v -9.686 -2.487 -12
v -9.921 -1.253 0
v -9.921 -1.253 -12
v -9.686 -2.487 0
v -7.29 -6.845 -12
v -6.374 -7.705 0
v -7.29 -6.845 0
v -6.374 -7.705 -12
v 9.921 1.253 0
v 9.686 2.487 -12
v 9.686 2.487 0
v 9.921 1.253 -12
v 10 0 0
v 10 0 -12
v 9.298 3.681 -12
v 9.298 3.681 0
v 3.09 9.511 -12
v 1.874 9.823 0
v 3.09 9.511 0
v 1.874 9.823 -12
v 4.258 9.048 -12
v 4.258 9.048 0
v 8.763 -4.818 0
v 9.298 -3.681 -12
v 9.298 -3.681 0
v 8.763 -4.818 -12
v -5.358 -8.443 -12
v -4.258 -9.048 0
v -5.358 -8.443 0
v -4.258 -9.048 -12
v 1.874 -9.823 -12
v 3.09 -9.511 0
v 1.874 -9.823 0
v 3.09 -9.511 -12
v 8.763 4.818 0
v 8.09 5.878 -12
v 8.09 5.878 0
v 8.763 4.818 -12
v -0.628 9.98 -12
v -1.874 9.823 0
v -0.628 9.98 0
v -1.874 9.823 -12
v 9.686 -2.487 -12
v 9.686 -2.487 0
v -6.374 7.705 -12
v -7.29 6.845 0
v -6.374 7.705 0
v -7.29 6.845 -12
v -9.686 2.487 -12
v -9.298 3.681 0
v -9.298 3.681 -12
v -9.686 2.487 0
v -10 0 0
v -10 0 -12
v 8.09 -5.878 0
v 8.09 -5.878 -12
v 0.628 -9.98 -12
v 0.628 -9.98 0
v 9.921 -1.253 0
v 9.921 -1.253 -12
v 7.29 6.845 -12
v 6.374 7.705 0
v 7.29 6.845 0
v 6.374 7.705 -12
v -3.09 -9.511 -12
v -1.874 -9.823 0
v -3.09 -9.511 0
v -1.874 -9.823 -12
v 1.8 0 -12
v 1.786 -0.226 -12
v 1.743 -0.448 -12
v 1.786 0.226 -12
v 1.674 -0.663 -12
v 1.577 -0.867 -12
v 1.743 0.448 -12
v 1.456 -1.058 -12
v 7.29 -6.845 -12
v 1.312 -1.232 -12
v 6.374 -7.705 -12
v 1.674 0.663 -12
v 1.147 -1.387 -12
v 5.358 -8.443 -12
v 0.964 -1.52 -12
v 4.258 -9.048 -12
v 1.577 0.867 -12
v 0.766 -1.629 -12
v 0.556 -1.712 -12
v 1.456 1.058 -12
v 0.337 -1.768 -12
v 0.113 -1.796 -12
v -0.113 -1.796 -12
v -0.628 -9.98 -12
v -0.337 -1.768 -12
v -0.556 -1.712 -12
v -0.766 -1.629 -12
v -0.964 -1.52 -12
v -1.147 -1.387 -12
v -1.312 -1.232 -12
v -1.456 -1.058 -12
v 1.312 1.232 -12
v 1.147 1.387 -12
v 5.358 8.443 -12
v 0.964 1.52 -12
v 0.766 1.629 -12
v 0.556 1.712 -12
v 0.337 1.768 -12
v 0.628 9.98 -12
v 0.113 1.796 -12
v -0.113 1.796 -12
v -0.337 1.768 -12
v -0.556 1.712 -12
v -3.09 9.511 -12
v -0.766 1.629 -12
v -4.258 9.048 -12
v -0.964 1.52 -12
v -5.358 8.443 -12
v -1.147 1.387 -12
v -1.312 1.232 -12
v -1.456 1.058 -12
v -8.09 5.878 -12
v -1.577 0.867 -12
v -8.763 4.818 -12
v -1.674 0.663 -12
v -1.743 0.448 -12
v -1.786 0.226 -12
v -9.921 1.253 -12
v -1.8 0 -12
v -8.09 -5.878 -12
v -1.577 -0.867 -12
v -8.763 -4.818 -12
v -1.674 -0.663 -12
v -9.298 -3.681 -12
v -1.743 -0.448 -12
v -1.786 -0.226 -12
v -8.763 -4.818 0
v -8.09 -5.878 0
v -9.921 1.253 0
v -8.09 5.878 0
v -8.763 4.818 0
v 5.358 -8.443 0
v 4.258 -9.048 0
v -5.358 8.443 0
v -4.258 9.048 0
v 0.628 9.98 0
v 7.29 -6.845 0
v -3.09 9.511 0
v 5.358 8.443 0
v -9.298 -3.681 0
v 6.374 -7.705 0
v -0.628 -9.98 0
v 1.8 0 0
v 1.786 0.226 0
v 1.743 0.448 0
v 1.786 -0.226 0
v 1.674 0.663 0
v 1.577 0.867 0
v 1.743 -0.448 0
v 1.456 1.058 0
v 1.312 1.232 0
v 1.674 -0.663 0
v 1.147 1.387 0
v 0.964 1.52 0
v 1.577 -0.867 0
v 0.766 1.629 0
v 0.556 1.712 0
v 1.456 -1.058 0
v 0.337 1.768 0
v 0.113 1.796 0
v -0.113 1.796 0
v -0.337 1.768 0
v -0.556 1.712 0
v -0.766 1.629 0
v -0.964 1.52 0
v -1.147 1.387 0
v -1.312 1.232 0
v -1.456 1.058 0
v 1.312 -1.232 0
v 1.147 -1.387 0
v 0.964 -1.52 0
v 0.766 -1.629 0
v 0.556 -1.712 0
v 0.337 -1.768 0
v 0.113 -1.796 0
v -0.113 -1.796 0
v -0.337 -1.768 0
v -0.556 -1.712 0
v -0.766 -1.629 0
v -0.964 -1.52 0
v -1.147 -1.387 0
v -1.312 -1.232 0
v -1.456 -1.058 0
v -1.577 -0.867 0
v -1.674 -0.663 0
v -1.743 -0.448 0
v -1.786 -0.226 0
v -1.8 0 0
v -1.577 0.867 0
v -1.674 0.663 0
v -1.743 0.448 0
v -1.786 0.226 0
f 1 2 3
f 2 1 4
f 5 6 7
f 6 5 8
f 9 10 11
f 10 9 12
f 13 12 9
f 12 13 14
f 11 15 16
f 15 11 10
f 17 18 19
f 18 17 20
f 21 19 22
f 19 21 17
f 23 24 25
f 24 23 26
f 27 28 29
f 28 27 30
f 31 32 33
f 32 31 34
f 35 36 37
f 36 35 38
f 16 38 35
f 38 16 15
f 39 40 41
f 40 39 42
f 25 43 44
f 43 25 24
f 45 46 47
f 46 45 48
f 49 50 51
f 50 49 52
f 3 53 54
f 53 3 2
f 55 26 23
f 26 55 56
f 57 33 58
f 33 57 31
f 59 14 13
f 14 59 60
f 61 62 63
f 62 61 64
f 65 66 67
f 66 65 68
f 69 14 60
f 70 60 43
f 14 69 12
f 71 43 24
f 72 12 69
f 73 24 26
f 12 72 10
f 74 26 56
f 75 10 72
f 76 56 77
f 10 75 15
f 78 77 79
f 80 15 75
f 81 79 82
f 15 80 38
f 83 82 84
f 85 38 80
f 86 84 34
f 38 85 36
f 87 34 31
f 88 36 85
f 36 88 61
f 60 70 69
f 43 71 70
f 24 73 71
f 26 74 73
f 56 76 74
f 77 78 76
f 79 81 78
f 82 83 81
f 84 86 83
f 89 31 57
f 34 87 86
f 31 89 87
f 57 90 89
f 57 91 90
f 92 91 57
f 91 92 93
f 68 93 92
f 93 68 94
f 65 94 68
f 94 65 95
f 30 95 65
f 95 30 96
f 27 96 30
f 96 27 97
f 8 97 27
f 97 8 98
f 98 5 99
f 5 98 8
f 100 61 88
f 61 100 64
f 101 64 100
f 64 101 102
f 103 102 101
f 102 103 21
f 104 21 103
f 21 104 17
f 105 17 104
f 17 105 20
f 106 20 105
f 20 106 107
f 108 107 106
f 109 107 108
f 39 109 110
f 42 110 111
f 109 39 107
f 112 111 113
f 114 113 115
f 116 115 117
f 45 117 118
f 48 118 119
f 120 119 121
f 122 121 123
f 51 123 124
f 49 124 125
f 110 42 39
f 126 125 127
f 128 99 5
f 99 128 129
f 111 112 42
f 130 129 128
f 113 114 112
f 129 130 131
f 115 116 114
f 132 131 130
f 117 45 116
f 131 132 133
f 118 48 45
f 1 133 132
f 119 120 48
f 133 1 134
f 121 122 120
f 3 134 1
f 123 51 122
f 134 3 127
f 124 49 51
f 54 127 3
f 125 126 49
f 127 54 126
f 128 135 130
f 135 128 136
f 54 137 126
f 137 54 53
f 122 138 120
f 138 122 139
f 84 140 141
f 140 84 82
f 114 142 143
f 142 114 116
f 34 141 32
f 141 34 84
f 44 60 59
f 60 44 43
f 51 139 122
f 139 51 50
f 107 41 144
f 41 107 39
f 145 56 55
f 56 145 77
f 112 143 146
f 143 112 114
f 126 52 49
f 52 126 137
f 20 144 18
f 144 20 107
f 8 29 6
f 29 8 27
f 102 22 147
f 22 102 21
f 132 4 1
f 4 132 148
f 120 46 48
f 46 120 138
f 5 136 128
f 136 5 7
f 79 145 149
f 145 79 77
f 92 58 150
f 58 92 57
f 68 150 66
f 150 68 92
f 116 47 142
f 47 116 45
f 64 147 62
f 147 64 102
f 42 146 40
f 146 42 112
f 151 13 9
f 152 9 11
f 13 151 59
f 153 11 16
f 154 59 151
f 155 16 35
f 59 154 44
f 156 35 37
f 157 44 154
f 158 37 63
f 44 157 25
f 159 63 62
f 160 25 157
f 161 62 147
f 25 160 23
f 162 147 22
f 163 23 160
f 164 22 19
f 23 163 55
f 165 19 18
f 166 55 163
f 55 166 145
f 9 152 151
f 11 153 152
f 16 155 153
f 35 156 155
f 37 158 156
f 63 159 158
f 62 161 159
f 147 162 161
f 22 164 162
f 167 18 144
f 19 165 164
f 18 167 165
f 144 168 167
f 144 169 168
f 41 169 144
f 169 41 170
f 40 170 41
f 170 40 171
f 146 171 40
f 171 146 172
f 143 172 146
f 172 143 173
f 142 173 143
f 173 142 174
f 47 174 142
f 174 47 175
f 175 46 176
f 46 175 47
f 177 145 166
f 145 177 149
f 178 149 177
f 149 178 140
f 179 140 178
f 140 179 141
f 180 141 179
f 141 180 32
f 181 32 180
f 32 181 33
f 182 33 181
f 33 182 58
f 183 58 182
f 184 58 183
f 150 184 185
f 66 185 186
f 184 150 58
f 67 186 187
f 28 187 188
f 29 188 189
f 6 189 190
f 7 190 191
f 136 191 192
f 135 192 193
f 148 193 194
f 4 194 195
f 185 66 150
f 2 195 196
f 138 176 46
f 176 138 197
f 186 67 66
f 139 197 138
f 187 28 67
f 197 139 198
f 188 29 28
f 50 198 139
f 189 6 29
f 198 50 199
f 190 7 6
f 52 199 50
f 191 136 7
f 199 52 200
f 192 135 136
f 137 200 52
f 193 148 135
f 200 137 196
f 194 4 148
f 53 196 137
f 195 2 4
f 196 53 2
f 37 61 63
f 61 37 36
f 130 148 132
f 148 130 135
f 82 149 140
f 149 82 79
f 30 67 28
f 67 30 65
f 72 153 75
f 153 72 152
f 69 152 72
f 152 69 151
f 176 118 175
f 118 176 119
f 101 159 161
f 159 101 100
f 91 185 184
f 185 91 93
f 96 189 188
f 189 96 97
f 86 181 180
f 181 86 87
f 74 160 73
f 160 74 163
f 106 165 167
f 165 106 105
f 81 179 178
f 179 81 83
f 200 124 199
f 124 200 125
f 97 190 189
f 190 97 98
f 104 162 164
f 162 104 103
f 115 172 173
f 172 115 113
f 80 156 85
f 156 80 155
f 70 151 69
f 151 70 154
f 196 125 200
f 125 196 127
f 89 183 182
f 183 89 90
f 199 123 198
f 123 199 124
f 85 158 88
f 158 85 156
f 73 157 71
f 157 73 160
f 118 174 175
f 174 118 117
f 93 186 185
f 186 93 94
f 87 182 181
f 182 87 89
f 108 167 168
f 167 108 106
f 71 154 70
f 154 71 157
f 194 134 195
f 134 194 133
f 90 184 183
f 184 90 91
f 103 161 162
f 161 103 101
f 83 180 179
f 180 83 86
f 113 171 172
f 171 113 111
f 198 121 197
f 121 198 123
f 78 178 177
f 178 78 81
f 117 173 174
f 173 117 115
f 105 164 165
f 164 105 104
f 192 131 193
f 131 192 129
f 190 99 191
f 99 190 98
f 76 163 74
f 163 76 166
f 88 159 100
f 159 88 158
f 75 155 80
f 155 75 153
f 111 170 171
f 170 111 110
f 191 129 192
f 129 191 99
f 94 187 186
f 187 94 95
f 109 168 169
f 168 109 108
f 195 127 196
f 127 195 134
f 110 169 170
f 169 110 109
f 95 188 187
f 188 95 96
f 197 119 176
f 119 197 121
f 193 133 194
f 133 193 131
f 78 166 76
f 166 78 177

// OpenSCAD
$fn = 50;


difference() {
	union() {
		translate(v = [0, 0, -12.0000000000]) {
			cylinder(h = 12, r = 10.0000000000);
		}
		cylinder(h = 0, r = 16.0000000000);
	}
	union() {
		#translate(v = [0, 0, -12]) {
			cylinder(h = 12, r = 1.8000000000);
		}
	}
}
